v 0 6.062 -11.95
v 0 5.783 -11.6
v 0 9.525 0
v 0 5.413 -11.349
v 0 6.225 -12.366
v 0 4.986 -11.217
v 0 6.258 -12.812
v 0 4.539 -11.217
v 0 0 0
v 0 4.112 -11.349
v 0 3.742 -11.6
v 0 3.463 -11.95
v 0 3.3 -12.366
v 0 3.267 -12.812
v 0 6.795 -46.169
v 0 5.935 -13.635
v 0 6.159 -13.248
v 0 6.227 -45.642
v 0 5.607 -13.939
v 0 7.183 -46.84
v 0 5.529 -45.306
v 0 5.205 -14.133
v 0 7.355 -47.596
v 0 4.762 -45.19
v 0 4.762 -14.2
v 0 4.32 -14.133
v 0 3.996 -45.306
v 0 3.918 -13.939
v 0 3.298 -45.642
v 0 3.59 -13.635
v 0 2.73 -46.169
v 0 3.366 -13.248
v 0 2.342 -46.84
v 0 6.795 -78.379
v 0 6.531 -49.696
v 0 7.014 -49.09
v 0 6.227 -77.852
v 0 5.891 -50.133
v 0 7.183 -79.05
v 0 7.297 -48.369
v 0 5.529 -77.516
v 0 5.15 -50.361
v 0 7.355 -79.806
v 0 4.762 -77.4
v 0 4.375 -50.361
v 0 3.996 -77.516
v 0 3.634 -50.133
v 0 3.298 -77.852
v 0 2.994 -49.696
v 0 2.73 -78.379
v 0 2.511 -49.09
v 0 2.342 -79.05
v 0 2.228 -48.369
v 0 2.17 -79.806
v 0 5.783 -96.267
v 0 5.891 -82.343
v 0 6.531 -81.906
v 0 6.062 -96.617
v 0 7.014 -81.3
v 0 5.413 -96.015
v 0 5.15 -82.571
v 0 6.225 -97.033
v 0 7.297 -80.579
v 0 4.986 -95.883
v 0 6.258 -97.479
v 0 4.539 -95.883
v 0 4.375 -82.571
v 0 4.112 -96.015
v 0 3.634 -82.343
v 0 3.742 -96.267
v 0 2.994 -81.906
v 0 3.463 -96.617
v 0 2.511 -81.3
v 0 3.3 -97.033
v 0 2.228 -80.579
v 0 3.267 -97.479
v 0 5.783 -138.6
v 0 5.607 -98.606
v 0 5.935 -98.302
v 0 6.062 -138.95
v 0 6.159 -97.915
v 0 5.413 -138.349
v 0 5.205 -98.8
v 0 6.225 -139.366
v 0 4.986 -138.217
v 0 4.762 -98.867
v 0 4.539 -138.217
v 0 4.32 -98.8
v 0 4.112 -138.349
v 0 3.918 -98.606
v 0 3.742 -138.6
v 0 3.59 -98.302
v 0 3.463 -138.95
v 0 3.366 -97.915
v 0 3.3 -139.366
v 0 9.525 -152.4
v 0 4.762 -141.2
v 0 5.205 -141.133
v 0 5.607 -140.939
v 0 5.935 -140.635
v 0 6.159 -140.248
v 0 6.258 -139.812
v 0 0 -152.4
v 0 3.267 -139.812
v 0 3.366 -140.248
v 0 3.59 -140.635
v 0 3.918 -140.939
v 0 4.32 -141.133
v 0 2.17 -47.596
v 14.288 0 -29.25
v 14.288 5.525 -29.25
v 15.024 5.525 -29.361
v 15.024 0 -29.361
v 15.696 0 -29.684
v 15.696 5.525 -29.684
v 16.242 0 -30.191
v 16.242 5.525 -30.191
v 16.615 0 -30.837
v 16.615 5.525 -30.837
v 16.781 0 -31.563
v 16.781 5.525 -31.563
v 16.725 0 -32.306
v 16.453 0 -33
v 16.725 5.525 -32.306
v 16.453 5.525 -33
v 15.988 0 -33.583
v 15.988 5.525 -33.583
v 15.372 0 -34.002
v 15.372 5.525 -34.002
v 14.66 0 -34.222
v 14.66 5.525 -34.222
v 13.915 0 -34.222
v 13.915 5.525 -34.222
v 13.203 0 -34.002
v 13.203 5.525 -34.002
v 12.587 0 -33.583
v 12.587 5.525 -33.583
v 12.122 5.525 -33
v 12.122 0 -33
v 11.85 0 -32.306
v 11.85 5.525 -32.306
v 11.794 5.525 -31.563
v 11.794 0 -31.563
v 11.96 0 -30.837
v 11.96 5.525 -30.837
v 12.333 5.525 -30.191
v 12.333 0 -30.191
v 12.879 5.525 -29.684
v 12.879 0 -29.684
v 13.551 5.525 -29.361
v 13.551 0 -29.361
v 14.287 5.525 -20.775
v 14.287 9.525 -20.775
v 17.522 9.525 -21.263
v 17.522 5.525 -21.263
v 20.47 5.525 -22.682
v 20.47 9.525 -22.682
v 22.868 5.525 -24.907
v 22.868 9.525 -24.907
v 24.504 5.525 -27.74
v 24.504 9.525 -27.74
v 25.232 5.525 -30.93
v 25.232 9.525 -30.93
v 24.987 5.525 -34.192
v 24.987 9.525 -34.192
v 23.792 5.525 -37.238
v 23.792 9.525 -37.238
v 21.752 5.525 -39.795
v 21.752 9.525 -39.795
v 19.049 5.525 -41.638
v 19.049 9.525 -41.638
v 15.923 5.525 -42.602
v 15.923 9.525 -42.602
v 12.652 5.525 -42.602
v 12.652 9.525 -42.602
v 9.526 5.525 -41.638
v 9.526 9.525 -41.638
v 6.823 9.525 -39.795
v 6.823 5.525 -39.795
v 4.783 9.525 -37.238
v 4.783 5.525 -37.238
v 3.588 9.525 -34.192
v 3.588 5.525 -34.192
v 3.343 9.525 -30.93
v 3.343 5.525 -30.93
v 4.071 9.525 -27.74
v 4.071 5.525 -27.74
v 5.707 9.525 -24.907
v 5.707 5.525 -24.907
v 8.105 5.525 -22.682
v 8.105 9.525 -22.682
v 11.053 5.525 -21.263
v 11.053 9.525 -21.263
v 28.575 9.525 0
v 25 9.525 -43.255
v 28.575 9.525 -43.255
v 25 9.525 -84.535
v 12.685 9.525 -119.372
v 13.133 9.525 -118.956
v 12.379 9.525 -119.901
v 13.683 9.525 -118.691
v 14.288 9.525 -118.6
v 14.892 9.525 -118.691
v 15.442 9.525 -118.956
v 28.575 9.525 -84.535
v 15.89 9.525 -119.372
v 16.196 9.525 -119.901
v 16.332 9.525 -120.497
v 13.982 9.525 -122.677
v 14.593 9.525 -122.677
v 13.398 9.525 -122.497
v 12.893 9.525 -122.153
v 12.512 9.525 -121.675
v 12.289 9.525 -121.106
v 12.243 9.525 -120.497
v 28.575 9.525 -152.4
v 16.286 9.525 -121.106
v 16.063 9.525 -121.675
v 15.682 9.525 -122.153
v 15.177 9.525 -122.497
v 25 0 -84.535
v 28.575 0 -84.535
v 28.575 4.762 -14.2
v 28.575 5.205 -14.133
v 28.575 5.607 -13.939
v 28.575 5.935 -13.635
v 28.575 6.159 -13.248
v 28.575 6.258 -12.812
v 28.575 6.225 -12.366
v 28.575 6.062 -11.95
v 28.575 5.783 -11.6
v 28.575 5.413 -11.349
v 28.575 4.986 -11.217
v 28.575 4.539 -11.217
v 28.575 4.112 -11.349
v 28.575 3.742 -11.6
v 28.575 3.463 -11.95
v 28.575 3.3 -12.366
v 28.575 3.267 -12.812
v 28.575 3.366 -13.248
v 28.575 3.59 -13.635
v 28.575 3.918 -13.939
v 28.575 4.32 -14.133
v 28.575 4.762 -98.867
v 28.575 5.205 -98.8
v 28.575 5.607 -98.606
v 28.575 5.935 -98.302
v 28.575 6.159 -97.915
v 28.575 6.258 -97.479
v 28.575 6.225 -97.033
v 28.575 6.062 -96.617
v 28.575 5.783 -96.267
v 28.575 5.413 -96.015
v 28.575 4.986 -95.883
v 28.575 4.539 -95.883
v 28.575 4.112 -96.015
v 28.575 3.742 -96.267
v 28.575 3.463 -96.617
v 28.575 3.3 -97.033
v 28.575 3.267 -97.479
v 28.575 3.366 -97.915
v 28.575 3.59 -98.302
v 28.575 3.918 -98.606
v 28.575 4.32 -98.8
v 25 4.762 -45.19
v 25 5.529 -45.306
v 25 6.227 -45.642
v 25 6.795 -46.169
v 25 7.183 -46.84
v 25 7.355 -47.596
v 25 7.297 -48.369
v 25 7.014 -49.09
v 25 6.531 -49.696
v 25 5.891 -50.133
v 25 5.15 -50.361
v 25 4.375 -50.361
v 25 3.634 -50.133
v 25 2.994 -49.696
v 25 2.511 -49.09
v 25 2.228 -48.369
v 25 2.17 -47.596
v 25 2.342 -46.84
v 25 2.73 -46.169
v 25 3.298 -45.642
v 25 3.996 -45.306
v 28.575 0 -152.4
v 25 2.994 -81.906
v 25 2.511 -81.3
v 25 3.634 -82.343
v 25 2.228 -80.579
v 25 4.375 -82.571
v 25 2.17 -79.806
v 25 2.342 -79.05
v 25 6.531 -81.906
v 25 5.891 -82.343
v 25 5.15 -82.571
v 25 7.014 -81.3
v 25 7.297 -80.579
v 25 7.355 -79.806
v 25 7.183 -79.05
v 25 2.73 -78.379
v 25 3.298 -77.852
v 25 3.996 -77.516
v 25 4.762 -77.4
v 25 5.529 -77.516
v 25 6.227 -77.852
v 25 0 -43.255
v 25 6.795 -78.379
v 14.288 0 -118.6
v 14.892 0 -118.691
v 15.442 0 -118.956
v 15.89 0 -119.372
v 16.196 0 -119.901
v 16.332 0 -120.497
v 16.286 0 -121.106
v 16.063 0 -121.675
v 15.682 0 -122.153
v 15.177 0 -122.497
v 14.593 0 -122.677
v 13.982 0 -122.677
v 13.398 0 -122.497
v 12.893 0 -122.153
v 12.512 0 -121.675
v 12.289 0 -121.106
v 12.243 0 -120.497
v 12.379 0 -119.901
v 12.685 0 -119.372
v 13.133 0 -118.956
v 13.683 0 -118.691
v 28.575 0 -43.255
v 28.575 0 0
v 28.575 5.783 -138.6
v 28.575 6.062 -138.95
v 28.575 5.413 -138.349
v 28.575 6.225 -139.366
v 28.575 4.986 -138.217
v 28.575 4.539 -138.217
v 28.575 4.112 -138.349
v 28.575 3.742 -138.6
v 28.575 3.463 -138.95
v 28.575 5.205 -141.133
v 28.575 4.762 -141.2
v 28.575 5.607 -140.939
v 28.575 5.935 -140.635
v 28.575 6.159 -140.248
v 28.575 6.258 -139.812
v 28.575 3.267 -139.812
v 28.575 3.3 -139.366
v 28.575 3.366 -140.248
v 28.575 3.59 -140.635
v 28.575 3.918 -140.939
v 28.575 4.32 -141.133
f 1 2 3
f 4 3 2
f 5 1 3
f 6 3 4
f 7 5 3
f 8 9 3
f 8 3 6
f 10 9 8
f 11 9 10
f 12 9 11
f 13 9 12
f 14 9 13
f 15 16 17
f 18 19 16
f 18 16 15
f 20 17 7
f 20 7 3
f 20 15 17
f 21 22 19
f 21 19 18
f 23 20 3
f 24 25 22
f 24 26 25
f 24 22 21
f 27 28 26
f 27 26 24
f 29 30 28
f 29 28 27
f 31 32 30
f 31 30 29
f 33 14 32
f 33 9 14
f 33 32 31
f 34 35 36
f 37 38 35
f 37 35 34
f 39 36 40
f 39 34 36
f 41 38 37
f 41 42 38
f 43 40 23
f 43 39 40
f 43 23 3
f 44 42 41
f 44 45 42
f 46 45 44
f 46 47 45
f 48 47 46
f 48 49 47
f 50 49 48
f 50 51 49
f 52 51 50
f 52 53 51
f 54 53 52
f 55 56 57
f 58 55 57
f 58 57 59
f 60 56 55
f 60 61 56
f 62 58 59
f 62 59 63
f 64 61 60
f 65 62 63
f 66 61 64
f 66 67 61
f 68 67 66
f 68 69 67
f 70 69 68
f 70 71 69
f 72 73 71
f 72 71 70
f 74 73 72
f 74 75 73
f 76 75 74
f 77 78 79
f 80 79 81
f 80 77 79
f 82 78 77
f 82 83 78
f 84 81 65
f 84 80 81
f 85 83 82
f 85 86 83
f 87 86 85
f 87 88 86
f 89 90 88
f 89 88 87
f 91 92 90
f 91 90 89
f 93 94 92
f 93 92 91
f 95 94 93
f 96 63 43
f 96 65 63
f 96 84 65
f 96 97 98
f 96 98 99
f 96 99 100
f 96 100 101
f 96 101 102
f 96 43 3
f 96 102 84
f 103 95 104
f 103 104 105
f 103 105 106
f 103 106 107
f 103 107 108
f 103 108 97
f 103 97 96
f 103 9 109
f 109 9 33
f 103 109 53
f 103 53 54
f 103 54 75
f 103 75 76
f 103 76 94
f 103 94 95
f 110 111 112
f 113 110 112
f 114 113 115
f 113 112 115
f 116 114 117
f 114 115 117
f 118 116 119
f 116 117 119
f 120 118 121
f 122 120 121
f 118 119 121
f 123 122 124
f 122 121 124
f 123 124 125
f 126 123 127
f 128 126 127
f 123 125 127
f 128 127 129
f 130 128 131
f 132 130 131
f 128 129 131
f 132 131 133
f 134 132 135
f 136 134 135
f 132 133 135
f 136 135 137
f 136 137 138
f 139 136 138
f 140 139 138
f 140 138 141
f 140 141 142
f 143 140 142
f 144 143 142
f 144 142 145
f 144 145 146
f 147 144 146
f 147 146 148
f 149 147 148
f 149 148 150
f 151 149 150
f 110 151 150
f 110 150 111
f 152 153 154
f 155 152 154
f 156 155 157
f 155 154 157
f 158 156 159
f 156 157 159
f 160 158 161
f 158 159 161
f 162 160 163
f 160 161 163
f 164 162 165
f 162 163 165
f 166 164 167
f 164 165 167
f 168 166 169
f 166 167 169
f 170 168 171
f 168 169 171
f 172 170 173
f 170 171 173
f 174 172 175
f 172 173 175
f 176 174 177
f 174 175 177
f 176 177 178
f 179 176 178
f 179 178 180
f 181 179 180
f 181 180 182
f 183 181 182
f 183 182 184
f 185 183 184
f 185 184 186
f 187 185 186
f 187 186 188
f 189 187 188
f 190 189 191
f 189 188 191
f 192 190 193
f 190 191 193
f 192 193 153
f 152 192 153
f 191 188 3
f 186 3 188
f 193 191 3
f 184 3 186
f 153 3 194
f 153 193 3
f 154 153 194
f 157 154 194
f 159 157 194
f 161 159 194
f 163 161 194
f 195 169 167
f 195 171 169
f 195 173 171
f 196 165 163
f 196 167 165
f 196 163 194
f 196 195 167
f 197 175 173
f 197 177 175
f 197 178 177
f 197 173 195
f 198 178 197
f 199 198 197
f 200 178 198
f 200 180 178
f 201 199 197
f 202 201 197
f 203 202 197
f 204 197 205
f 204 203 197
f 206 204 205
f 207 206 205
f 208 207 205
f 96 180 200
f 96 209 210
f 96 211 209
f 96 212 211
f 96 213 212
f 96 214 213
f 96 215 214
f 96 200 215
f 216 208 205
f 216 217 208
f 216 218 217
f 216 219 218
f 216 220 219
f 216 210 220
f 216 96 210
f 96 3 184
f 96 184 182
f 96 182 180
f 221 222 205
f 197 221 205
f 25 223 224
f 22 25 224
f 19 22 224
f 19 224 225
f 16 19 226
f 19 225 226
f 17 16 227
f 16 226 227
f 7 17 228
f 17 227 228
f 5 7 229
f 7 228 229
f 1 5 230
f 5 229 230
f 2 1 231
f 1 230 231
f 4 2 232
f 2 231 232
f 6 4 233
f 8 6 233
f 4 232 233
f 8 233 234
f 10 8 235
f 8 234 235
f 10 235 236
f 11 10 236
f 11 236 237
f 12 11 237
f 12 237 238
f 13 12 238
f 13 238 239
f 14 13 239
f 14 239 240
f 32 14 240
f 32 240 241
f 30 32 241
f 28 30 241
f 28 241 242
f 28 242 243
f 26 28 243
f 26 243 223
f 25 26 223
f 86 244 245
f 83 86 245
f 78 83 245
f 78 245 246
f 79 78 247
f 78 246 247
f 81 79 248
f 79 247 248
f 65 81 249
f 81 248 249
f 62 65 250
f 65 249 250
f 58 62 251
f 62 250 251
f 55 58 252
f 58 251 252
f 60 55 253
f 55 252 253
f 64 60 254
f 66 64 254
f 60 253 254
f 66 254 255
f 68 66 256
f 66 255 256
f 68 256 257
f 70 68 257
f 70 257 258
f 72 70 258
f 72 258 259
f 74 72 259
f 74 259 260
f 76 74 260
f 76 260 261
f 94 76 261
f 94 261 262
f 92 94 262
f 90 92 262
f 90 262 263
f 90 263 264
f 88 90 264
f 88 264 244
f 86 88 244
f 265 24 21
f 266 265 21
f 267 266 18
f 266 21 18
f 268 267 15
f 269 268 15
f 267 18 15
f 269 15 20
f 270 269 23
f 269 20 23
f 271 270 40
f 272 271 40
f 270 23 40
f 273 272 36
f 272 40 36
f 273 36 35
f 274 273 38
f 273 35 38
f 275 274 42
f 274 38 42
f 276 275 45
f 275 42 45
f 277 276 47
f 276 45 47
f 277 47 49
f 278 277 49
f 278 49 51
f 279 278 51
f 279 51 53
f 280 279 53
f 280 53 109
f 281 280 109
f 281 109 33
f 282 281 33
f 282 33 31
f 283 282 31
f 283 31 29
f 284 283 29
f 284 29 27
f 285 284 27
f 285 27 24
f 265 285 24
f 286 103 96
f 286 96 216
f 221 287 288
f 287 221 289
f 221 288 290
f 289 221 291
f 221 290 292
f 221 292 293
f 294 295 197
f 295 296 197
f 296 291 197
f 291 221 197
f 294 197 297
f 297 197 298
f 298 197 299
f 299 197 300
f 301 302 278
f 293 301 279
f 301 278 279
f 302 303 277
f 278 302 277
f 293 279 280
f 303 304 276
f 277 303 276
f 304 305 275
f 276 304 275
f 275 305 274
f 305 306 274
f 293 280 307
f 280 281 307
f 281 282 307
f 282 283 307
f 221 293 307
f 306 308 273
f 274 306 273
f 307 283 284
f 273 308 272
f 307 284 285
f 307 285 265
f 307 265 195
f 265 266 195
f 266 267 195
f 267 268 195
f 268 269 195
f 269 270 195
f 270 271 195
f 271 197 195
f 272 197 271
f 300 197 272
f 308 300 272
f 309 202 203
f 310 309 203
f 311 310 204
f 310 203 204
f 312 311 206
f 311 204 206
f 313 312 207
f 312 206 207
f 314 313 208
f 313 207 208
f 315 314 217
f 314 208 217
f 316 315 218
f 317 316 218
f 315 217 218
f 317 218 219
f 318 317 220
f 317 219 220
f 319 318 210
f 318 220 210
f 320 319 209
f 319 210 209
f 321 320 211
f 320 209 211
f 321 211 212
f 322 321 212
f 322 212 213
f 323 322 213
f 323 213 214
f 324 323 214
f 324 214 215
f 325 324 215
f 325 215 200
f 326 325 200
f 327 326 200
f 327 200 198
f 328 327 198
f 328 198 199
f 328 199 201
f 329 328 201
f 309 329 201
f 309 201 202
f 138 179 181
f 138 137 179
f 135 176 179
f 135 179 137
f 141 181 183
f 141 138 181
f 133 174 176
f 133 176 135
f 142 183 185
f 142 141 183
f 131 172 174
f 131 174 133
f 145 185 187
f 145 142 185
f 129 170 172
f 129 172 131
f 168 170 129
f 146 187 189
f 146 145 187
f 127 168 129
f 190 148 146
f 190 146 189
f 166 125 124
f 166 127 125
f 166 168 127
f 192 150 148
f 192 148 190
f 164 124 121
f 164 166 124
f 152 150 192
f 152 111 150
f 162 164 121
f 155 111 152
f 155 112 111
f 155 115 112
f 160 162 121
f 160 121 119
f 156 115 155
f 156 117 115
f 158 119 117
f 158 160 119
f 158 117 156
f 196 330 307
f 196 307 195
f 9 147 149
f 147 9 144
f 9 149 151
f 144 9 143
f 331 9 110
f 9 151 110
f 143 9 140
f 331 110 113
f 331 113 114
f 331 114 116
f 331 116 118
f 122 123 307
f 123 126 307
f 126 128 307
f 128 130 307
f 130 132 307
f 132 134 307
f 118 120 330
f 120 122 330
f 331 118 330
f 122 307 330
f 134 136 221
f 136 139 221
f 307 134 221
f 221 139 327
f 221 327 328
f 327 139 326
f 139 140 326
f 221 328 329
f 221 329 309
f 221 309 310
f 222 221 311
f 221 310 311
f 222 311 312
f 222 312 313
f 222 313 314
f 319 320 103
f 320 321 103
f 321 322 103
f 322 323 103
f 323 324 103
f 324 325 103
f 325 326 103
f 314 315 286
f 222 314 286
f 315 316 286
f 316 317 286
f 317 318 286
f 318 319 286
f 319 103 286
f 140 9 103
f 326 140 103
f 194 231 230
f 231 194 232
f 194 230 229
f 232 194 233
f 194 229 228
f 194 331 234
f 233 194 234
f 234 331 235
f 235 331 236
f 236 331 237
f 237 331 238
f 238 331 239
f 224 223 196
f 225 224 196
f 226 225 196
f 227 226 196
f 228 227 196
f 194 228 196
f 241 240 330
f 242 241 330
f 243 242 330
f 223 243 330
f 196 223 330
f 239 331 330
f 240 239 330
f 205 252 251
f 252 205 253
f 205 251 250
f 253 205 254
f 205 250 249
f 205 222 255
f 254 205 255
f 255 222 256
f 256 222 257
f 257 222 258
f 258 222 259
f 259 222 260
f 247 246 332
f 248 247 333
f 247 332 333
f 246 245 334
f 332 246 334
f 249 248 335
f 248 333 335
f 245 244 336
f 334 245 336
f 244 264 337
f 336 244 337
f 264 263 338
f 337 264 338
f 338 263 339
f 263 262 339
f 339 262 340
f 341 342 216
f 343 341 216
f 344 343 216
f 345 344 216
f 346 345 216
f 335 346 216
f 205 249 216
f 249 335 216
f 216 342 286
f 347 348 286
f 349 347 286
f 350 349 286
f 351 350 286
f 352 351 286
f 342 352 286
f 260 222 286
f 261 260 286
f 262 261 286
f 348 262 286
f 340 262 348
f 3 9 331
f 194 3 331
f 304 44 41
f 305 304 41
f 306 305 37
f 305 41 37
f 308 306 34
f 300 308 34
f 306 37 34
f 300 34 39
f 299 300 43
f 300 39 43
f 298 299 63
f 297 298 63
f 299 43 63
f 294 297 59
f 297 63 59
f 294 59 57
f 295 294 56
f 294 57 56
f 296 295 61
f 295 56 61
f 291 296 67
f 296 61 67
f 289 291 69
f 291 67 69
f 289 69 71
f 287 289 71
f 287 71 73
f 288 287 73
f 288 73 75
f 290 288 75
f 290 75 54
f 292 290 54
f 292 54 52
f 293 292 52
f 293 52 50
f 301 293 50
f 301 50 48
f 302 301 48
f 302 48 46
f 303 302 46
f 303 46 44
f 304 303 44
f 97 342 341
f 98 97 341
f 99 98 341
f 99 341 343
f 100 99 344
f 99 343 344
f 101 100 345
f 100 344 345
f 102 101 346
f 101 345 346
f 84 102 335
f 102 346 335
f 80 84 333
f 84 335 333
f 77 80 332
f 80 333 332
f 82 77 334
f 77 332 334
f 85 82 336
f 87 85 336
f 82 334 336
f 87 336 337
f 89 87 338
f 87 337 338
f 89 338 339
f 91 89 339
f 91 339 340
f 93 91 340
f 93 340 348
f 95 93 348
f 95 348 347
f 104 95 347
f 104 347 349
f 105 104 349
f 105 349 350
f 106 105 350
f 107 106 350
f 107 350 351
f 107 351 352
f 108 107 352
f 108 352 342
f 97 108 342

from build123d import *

# Parameters (mm, degrees)
SKETCH2_W             = 28.575
SKETCH2_H             = 152.4
BOSS_EXTRUDE1_DEPTH   = 9.525
F_3_0MM_DOWEL_HOLE1_D = 3
LPATTERN1_COUNT       = 4
LPATTERN1_PITCH       = 42.333333333
SKETCH12_R            = 2.05
CUT_EXTRUDE1_DEPTH    = 156.348048749
SKETCH12_4_R          = 10.975
CUT_EXTRUDE2_DEPTH    = 4
SKETCH15_R            = 2.5
CUT_EXTRUDE3_DEPTH    = 156.154169296
SKETCH13_R            = 2.6
CUT_EXTRUDE4_DEPTH    = 156.348048749
SKETCH17_W            = 41.28
SKETCH17_H            = 9.525
CUT_EXTRUDE5_DEPTH    = 3.575


with BuildPart() as part:
    # Sketch2 → Boss-Extrude1 (new body)
    with BuildSketch(Plane(origin=(0, 0, 0), x_dir=(1, 0, 0), z_dir=(0, 1, 0))):
        with Locations((14.2875, 76.2)):
            Rectangle(SKETCH2_W, SKETCH2_H)
    extrude(amount=BOSS_EXTRUDE1_DEPTH)

    # Ø3.0mm Dowel Hole1 (through all)
    with Locations(Plane.ZY):
        with Locations((-139.7, 4.7625)):
            f_3_0mm_dowel_hole1 = Hole(F_3_0MM_DOWEL_HOLE1_D / 2)

    # LPattern1: Ø3.0mm Dowel Hole1 ×4, 1 skipped
    with Locations(*[(0, 0, i * LPATTERN1_PITCH) for i in range(1, LPATTERN1_COUNT) if i not in (2,)]):
        add(f_3_0mm_dowel_hole1, mode=Mode.SUBTRACT)

    # Sketch12 → Cut-Extrude1 (cut, through all)
    with BuildSketch(Plane(origin=(0, 9.525, 0), x_dir=(1, 0, 0), z_dir=(0, 1, 0))):
        with Locations(Location((14.2875, 120.65, 0), (0, 0, 270))):
            Circle(SKETCH12_R)
    extrude(amount=-CUT_EXTRUDE1_DEPTH, mode=Mode.SUBTRACT)

    # Sketch12<4> → Cut-Extrude2 (cut)
    with BuildSketch(Plane(origin=(0, 9.525, 0), x_dir=(1, 0, 0), z_dir=(0, 1, 0))):
        with Locations(Location((14.2875, 31.75, 0), (0, 0, 270))):
            Circle(SKETCH12_4_R)
    extrude(amount=-CUT_EXTRUDE2_DEPTH, mode=Mode.SUBTRACT)

    # Sketch15 → Cut-Extrude3 (cut, through all)
    with BuildSketch(Plane(origin=(0, 5.525, 0), x_dir=(1, 0, 0), z_dir=(0, 1, 0))):
        with Locations(Location((14.2875, 31.75, 0), (0, 0, 270))):
            Circle(SKETCH15_R)
    extrude(amount=-CUT_EXTRUDE3_DEPTH, mode=Mode.SUBTRACT)

    # Sketch13 → Cut-Extrude4 (cut, through all)
    with BuildSketch(Plane.ZY):
        with Locations((-80, 4.7625)):
            Circle(SKETCH13_R)
        with Locations((-47.79, 4.7625)):
            Circle(SKETCH13_R)
    extrude(amount=-CUT_EXTRUDE4_DEPTH, mode=Mode.SUBTRACT)

    # Sketch17 → Cut-Extrude5 (cut)
    with BuildSketch(Plane.ZY.offset(-28.575)):
        with Locations((-63.895, 4.7625)):
            Rectangle(SKETCH17_W, SKETCH17_H)
    extrude(amount=CUT_EXTRUDE5_DEPTH, mode=Mode.SUBTRACT)


solid = part.part
